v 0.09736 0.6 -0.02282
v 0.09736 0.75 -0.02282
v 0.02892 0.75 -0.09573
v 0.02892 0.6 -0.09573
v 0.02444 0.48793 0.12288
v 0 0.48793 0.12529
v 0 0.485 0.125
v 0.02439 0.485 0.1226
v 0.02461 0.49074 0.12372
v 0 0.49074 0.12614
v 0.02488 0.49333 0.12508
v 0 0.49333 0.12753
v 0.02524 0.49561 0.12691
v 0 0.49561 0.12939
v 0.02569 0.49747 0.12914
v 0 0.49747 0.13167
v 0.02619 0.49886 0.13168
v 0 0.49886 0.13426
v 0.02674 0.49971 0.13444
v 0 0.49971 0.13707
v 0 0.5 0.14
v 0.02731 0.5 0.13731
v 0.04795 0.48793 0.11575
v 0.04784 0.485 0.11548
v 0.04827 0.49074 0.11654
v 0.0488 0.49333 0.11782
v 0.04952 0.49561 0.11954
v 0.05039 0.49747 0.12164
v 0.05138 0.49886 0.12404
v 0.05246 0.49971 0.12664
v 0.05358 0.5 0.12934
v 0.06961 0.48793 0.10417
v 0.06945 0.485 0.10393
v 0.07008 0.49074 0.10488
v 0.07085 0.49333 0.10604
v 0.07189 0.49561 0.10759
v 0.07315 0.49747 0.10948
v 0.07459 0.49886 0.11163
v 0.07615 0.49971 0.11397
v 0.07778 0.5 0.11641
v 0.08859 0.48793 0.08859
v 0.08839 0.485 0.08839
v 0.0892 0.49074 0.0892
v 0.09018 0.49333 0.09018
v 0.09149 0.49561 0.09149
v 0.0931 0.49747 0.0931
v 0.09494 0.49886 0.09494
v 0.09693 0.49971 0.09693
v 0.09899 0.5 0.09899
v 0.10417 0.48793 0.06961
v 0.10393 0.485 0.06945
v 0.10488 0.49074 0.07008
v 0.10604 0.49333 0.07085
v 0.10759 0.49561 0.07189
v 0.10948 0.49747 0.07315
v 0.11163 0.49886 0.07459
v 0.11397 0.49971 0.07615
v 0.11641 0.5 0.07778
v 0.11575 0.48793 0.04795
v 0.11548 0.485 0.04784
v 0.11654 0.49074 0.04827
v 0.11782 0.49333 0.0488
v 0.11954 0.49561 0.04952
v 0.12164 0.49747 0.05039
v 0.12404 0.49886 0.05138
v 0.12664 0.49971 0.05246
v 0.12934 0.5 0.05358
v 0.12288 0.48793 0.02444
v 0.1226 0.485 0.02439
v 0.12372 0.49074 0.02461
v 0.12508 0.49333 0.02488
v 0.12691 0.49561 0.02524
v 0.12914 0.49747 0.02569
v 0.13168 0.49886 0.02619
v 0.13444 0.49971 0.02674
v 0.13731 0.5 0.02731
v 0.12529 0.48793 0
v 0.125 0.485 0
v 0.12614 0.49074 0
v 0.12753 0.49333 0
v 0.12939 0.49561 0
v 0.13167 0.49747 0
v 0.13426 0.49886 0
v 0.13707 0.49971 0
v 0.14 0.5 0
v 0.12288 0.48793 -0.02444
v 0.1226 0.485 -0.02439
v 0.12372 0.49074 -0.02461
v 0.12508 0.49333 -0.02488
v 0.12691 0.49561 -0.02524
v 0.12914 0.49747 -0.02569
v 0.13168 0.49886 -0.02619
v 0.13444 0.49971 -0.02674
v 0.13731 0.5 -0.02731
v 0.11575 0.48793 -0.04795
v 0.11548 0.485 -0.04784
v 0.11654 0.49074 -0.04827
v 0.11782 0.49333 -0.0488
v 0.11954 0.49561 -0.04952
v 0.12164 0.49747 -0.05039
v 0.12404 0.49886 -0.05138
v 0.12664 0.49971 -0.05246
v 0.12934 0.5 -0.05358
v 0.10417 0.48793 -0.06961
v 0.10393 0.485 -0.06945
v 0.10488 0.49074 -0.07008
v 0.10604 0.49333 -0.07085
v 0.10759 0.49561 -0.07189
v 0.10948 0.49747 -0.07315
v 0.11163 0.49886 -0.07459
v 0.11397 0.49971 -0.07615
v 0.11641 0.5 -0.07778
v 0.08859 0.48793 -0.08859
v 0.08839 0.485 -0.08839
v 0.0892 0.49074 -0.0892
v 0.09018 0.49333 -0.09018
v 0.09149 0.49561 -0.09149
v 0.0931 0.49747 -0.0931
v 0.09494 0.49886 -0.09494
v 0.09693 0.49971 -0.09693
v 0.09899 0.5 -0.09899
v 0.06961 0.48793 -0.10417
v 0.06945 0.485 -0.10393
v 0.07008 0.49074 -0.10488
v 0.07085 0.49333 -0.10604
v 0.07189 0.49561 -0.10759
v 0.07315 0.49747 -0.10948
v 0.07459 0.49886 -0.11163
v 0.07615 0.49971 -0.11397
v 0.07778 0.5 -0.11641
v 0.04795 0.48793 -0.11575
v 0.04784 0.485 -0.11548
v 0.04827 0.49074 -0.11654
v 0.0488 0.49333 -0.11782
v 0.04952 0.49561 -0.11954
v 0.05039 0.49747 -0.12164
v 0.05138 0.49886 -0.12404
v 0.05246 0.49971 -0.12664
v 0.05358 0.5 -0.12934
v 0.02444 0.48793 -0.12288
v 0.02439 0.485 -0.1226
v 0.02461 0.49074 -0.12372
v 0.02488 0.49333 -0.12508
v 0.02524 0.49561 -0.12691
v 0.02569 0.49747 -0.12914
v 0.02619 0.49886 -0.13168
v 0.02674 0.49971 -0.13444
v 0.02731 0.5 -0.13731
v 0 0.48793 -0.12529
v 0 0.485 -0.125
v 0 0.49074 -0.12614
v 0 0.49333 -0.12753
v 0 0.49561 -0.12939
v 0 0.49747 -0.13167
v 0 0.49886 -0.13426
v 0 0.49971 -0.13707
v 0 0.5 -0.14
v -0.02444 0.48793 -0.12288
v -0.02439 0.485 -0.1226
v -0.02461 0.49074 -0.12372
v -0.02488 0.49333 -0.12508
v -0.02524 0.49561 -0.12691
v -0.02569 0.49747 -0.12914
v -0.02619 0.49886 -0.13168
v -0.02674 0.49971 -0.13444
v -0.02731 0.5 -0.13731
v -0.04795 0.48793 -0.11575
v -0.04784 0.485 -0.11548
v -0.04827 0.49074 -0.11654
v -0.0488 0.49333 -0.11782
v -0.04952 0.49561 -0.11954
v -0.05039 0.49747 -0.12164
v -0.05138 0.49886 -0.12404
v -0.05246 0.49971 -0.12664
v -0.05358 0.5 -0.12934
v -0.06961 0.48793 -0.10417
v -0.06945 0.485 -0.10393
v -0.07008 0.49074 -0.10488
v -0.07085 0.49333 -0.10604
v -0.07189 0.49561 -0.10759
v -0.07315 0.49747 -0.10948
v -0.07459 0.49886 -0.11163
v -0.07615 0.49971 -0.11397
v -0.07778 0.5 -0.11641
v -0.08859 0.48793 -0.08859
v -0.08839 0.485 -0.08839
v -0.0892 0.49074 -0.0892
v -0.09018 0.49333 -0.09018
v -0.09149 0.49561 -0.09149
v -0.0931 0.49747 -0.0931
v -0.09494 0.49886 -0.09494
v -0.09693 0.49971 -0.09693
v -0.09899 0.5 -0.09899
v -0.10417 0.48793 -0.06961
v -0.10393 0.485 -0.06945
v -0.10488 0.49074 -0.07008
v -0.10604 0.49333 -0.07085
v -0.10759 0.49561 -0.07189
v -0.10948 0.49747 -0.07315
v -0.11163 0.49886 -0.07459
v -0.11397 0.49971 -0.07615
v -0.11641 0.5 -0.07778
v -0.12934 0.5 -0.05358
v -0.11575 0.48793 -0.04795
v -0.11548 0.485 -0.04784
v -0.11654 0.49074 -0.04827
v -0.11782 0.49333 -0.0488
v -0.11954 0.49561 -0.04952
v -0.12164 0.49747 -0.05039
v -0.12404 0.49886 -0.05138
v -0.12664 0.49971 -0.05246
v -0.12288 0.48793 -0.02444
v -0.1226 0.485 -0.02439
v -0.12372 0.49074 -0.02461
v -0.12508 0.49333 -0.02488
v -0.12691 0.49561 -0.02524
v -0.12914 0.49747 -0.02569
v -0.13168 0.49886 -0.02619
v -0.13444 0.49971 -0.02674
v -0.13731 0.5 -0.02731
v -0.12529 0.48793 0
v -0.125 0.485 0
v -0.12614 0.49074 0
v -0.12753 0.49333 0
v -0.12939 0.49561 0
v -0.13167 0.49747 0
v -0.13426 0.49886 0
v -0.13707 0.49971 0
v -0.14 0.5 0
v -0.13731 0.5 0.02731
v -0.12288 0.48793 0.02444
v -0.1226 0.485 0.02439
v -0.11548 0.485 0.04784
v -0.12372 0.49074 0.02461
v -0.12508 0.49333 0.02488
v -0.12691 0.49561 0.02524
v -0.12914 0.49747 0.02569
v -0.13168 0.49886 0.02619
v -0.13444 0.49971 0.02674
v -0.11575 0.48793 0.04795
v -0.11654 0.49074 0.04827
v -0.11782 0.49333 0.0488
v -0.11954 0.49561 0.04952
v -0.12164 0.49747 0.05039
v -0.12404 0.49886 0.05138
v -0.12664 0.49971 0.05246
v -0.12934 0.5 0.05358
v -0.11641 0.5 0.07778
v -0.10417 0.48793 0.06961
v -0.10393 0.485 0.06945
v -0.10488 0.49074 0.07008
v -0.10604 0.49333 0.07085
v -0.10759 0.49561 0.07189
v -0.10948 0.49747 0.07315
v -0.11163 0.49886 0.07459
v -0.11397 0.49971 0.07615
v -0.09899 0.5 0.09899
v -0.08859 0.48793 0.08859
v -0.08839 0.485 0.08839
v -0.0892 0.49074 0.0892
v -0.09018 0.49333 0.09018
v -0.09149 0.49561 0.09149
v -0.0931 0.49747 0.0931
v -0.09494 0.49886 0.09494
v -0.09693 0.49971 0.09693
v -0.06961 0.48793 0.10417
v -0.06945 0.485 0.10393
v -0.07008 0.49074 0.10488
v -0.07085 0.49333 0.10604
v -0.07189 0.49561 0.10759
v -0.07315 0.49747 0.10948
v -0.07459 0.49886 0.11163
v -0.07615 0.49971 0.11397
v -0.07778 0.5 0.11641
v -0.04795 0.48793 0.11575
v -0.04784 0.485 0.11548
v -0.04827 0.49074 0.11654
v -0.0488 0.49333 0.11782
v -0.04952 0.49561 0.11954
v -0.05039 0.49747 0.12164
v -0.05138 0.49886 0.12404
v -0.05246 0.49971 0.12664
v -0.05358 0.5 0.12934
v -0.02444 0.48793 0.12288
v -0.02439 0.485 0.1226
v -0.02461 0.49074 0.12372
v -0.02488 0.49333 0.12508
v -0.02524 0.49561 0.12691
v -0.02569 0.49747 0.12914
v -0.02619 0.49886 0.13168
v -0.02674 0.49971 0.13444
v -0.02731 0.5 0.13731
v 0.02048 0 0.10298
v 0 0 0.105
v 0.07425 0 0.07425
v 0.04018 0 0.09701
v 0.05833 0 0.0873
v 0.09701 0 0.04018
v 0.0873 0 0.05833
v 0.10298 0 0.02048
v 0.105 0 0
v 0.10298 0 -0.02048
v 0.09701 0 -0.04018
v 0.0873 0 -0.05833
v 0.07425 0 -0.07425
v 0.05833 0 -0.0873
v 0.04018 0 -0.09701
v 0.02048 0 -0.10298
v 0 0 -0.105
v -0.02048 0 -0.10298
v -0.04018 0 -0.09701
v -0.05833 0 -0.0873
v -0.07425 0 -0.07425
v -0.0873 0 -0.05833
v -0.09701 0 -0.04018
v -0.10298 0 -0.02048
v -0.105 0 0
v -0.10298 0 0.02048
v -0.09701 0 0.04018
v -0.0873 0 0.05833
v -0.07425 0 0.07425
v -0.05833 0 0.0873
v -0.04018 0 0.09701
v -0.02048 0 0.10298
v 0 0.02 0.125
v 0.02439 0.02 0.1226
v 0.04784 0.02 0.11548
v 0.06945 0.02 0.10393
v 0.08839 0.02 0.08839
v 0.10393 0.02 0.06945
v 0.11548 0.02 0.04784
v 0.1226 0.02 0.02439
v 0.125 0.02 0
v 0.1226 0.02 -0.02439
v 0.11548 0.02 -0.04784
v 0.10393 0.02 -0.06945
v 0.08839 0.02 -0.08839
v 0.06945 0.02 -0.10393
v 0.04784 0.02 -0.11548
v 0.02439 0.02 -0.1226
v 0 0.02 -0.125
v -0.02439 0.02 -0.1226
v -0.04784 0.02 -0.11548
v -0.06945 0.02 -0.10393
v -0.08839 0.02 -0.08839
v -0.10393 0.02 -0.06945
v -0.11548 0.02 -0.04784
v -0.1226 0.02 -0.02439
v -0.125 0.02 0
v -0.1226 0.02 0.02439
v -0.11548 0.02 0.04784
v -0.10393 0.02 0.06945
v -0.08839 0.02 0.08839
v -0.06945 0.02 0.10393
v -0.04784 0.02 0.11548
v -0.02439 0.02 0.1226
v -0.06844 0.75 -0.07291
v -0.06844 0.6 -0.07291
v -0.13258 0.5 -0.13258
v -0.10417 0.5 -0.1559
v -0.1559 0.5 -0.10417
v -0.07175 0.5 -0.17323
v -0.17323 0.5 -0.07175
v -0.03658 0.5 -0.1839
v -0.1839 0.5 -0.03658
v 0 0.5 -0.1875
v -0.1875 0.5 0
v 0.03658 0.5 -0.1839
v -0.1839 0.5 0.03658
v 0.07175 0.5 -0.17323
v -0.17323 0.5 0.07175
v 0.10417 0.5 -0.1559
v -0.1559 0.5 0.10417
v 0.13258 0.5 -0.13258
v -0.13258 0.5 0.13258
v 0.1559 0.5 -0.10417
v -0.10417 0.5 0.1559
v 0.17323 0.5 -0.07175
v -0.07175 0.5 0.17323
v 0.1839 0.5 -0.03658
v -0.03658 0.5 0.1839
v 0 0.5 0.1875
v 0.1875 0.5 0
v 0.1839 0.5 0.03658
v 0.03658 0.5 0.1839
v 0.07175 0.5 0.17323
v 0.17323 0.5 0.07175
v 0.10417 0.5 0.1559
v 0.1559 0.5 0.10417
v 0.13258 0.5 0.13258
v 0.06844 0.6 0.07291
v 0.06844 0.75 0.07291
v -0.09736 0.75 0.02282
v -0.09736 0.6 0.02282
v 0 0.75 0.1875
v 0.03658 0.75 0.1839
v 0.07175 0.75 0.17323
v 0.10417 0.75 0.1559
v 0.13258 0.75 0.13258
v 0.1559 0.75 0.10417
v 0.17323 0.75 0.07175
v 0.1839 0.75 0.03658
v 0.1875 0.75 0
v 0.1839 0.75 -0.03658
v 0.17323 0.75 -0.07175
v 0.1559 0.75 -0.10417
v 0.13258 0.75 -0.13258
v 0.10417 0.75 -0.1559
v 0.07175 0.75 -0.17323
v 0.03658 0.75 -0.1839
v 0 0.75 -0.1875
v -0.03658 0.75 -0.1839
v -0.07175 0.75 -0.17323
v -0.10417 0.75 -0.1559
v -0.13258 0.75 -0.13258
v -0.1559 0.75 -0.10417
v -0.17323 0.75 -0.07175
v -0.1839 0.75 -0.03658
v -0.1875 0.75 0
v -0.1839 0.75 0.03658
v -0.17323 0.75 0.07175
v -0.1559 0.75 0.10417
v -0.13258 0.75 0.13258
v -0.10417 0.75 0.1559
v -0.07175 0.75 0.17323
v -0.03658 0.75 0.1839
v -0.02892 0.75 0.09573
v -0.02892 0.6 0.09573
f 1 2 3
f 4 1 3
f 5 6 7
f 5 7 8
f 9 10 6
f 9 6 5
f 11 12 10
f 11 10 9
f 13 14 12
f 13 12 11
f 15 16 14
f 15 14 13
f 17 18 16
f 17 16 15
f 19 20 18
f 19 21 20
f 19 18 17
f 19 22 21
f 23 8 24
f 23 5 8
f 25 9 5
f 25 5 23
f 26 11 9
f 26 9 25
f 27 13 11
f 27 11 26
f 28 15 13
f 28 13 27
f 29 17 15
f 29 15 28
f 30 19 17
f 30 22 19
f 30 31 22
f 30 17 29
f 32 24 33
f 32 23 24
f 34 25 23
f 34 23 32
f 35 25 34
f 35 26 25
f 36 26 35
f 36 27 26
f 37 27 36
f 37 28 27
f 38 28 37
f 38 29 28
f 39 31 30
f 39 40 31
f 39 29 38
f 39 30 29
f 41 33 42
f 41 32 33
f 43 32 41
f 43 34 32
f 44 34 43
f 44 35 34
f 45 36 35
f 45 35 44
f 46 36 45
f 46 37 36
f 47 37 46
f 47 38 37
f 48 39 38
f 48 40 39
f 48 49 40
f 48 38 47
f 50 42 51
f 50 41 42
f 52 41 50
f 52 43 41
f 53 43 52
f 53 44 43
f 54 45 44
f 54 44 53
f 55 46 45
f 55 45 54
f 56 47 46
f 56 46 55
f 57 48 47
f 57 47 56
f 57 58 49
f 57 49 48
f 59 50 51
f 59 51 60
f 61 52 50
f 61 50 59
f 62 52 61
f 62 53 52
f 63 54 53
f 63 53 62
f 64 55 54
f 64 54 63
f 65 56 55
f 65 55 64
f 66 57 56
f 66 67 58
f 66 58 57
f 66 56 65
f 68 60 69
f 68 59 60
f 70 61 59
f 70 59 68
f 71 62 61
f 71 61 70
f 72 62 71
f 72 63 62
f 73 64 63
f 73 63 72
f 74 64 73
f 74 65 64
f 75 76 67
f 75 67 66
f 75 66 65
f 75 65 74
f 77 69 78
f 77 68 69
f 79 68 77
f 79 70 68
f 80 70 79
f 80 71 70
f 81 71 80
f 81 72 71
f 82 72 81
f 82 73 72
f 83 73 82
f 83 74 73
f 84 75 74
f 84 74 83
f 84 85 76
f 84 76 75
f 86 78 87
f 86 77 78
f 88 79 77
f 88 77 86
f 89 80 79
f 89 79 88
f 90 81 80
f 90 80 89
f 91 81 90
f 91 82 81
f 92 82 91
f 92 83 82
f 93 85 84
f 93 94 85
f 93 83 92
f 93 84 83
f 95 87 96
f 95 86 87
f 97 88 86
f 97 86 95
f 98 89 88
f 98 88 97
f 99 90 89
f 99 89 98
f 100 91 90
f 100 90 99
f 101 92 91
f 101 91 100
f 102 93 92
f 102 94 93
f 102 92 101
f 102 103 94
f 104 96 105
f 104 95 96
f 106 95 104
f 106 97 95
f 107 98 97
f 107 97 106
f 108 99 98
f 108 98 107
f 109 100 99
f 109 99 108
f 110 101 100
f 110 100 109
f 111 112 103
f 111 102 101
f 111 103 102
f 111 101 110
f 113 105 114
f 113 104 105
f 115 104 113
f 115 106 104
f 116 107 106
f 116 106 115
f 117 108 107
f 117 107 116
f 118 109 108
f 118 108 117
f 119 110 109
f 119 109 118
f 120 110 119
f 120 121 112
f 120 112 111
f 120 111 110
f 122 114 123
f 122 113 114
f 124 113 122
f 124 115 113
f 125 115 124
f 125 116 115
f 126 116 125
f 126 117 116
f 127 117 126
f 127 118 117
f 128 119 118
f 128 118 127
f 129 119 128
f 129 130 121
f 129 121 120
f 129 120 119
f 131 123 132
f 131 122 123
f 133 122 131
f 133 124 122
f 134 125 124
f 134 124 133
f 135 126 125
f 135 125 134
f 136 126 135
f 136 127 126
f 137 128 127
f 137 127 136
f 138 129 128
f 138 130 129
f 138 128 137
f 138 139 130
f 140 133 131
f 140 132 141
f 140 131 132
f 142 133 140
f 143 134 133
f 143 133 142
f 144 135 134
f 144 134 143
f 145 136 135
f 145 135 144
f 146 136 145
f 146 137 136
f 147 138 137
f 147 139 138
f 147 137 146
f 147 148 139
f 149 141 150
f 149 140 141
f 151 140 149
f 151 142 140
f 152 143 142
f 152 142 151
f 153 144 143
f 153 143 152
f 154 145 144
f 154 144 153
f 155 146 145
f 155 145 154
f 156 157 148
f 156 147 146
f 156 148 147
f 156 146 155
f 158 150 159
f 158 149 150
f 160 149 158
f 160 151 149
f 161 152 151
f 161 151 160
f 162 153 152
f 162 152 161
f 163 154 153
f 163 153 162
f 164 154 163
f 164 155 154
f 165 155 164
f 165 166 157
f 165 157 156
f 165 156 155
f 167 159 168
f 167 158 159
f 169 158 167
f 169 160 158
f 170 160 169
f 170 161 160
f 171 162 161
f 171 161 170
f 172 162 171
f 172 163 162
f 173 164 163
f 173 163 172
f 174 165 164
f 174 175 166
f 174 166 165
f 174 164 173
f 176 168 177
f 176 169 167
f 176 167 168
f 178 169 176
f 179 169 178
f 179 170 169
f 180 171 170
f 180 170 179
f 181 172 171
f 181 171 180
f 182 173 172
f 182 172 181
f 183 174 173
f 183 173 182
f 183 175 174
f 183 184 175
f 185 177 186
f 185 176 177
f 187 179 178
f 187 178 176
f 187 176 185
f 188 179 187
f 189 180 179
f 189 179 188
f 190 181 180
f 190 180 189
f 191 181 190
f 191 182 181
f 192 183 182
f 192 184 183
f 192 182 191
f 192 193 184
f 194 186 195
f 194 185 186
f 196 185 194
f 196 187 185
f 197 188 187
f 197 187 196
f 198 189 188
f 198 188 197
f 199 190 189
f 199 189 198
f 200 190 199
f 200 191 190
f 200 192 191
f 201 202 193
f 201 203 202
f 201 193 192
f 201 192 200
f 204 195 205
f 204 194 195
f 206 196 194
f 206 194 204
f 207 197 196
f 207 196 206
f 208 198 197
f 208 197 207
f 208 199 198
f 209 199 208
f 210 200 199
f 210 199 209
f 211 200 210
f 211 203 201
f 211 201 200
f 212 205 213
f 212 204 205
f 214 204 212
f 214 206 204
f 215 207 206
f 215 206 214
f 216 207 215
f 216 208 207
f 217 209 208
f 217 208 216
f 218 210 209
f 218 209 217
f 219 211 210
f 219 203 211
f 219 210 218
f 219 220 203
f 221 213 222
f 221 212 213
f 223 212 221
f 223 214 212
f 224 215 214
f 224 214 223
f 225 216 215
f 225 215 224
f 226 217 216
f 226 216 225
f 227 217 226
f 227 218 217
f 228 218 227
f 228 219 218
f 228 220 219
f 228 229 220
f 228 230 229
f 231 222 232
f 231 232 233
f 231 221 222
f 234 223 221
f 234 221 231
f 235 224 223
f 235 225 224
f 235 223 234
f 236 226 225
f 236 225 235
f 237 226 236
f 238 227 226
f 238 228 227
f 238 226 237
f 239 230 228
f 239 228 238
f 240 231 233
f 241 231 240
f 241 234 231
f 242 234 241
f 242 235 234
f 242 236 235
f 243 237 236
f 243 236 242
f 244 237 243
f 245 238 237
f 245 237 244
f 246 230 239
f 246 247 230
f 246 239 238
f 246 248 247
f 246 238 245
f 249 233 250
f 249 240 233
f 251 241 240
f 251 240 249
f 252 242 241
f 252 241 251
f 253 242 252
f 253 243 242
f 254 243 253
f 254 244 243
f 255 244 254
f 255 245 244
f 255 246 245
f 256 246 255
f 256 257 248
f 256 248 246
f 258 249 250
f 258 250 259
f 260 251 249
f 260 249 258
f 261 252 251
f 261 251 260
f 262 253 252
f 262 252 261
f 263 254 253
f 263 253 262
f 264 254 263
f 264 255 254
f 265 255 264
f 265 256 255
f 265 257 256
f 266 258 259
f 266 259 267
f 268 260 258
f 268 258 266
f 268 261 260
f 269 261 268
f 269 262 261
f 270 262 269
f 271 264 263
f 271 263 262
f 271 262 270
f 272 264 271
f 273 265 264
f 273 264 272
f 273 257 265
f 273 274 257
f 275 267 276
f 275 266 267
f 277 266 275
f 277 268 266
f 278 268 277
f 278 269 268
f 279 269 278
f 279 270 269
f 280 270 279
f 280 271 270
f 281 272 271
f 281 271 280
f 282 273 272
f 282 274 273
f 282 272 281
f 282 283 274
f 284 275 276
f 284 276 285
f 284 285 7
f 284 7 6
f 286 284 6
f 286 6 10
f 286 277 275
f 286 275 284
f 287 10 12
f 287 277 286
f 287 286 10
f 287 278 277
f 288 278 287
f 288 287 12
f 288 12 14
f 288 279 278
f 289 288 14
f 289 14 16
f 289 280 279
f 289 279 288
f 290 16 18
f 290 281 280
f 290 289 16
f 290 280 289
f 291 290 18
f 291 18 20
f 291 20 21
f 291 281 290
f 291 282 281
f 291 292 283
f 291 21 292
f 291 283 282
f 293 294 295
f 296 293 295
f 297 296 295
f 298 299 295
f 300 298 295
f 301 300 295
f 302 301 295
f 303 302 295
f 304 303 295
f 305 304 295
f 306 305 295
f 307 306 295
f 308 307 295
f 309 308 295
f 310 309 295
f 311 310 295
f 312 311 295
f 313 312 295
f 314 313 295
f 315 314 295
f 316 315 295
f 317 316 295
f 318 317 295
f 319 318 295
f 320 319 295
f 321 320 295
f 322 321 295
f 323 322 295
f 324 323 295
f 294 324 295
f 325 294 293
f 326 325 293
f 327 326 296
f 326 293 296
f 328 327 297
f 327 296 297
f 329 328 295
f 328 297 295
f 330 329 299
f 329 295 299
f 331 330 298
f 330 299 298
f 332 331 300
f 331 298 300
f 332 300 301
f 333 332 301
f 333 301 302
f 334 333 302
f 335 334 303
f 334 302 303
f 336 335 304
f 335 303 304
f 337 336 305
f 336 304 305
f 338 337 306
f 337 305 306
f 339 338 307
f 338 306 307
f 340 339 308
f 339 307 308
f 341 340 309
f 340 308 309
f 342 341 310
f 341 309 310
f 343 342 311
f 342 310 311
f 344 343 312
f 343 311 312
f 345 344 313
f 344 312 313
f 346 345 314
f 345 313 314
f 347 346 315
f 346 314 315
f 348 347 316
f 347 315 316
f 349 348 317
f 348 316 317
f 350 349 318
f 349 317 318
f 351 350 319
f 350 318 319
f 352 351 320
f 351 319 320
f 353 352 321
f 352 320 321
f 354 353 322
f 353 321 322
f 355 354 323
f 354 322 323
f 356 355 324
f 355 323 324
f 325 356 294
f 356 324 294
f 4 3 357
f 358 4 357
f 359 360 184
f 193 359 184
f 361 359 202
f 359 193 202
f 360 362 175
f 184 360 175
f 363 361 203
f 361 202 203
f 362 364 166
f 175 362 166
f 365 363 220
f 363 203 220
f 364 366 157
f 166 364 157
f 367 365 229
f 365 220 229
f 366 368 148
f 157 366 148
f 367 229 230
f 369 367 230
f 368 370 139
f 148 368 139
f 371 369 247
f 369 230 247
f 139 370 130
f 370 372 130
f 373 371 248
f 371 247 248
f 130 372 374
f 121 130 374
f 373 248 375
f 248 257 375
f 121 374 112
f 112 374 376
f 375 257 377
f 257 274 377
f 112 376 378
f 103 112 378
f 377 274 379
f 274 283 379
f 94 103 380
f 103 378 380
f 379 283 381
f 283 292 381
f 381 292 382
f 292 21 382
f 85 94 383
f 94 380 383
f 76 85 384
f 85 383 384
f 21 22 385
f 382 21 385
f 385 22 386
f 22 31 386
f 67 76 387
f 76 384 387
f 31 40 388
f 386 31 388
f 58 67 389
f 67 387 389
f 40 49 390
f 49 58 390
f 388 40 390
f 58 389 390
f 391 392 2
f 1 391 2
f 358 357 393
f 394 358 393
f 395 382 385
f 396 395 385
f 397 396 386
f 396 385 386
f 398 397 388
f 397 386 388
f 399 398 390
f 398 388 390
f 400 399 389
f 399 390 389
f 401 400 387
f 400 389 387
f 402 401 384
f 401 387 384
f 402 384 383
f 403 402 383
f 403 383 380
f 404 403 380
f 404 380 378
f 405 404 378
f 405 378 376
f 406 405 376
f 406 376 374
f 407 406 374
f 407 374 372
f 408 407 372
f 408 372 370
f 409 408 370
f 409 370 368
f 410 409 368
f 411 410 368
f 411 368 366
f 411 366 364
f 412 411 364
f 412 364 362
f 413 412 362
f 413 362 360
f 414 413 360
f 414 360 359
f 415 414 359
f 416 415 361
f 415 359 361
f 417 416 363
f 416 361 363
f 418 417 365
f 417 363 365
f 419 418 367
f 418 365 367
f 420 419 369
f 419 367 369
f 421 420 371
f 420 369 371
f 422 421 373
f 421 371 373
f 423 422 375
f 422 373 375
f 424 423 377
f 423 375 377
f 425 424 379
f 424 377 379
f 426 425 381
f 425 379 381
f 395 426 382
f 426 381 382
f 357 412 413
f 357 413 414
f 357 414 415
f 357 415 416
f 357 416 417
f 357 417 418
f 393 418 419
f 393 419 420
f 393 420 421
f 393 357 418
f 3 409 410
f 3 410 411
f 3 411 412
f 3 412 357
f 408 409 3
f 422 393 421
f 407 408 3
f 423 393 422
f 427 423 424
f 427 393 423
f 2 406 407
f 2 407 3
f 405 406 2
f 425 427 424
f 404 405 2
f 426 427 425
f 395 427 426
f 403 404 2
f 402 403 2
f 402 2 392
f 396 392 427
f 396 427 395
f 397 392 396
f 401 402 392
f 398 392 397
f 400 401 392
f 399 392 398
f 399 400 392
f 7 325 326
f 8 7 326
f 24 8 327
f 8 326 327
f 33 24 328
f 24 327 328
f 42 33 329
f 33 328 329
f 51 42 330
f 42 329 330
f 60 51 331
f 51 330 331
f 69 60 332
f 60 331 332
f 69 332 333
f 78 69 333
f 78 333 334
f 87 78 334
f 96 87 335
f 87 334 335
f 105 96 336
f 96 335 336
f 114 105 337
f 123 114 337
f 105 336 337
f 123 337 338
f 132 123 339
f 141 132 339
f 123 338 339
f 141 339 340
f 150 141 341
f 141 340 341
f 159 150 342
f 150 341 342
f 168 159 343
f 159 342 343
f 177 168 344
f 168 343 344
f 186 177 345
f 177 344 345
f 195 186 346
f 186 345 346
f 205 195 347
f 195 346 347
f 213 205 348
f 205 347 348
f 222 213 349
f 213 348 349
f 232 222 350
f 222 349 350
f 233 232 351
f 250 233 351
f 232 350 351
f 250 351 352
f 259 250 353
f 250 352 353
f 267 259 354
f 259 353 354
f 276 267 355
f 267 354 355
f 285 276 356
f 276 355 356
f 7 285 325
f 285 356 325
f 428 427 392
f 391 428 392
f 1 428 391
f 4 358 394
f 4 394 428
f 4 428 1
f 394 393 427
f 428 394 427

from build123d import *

# Parameters (mm, degrees)
SKETCH2_R           = 0.1875
BOSS_EXTRUDE2_DEPTH = 0.75
CUT_EXTRUDE1_DEPTH  = 0.15
SKETCH4_R           = 0.1875
SKETCH4_R_2         = 0.125
CUT_EXTRUDE2_DEPTH  = 0.5
CHAMFER1_SIZE       = 0.02
FILLET1_R           = 0.015


with BuildPart() as part:
    # Sketch2 → Boss-Extrude2 (new body)
    with BuildSketch(Plane(origin=(0, 0, 0), x_dir=(1, 0, 0), z_dir=(0, 1, 0))):
        with Locations(Location((0, 0, 0), (0, 0, 270))):
            Circle(SKETCH2_R)
    extrude(amount=BOSS_EXTRUDE2_DEPTH)

    # Sketch3 → Cut-Extrude1 (cut)
    with BuildSketch(Plane(origin=(0, 0.75, 0), x_dir=(1, 0, 0), z_dir=(0, 1, 0))):
        Polygon((0.068443591, -0.072907303), (0.097361372, 0.022820237), (0.028917781, 0.09572754), (-0.068443591, 0.072907303), (-0.097361372, -0.022820237), (-0.028917781, -0.09572754), align=None)
    extrude(amount=-CUT_EXTRUDE1_DEPTH, mode=Mode.SUBTRACT)

    # Sketch4 → Cut-Extrude2 (cut)
    with BuildSketch(Plane(origin=(0, 0, 0), x_dir=(1, 0, 0), z_dir=(0, 1, 0))):
        with Locations(Location((0, 0, 0), (0, 0, 270))):
            Circle(SKETCH4_R)
        with Locations(Location((0, 0, 0), (0, 0, 270))):
            Circle(SKETCH4_R_2, mode=Mode.SUBTRACT)
    extrude(amount=CUT_EXTRUDE2_DEPTH, mode=Mode.SUBTRACT)

    # Chamfer1
    chamfer1_edges = [part.edges().sort_by_distance(p)[0] for p in [
        (0, 0, -0.125),
    ]]
    chamfer(chamfer1_edges, length=CHAMFER1_SIZE)

    # Fillet1
    fillet1_edges = [part.edges().sort_by_distance(p)[0] for p in [
        (0, 0.5, -0.125),
    ]]
    fillet(fillet1_edges, radius=FILLET1_R)


solid = part.part
